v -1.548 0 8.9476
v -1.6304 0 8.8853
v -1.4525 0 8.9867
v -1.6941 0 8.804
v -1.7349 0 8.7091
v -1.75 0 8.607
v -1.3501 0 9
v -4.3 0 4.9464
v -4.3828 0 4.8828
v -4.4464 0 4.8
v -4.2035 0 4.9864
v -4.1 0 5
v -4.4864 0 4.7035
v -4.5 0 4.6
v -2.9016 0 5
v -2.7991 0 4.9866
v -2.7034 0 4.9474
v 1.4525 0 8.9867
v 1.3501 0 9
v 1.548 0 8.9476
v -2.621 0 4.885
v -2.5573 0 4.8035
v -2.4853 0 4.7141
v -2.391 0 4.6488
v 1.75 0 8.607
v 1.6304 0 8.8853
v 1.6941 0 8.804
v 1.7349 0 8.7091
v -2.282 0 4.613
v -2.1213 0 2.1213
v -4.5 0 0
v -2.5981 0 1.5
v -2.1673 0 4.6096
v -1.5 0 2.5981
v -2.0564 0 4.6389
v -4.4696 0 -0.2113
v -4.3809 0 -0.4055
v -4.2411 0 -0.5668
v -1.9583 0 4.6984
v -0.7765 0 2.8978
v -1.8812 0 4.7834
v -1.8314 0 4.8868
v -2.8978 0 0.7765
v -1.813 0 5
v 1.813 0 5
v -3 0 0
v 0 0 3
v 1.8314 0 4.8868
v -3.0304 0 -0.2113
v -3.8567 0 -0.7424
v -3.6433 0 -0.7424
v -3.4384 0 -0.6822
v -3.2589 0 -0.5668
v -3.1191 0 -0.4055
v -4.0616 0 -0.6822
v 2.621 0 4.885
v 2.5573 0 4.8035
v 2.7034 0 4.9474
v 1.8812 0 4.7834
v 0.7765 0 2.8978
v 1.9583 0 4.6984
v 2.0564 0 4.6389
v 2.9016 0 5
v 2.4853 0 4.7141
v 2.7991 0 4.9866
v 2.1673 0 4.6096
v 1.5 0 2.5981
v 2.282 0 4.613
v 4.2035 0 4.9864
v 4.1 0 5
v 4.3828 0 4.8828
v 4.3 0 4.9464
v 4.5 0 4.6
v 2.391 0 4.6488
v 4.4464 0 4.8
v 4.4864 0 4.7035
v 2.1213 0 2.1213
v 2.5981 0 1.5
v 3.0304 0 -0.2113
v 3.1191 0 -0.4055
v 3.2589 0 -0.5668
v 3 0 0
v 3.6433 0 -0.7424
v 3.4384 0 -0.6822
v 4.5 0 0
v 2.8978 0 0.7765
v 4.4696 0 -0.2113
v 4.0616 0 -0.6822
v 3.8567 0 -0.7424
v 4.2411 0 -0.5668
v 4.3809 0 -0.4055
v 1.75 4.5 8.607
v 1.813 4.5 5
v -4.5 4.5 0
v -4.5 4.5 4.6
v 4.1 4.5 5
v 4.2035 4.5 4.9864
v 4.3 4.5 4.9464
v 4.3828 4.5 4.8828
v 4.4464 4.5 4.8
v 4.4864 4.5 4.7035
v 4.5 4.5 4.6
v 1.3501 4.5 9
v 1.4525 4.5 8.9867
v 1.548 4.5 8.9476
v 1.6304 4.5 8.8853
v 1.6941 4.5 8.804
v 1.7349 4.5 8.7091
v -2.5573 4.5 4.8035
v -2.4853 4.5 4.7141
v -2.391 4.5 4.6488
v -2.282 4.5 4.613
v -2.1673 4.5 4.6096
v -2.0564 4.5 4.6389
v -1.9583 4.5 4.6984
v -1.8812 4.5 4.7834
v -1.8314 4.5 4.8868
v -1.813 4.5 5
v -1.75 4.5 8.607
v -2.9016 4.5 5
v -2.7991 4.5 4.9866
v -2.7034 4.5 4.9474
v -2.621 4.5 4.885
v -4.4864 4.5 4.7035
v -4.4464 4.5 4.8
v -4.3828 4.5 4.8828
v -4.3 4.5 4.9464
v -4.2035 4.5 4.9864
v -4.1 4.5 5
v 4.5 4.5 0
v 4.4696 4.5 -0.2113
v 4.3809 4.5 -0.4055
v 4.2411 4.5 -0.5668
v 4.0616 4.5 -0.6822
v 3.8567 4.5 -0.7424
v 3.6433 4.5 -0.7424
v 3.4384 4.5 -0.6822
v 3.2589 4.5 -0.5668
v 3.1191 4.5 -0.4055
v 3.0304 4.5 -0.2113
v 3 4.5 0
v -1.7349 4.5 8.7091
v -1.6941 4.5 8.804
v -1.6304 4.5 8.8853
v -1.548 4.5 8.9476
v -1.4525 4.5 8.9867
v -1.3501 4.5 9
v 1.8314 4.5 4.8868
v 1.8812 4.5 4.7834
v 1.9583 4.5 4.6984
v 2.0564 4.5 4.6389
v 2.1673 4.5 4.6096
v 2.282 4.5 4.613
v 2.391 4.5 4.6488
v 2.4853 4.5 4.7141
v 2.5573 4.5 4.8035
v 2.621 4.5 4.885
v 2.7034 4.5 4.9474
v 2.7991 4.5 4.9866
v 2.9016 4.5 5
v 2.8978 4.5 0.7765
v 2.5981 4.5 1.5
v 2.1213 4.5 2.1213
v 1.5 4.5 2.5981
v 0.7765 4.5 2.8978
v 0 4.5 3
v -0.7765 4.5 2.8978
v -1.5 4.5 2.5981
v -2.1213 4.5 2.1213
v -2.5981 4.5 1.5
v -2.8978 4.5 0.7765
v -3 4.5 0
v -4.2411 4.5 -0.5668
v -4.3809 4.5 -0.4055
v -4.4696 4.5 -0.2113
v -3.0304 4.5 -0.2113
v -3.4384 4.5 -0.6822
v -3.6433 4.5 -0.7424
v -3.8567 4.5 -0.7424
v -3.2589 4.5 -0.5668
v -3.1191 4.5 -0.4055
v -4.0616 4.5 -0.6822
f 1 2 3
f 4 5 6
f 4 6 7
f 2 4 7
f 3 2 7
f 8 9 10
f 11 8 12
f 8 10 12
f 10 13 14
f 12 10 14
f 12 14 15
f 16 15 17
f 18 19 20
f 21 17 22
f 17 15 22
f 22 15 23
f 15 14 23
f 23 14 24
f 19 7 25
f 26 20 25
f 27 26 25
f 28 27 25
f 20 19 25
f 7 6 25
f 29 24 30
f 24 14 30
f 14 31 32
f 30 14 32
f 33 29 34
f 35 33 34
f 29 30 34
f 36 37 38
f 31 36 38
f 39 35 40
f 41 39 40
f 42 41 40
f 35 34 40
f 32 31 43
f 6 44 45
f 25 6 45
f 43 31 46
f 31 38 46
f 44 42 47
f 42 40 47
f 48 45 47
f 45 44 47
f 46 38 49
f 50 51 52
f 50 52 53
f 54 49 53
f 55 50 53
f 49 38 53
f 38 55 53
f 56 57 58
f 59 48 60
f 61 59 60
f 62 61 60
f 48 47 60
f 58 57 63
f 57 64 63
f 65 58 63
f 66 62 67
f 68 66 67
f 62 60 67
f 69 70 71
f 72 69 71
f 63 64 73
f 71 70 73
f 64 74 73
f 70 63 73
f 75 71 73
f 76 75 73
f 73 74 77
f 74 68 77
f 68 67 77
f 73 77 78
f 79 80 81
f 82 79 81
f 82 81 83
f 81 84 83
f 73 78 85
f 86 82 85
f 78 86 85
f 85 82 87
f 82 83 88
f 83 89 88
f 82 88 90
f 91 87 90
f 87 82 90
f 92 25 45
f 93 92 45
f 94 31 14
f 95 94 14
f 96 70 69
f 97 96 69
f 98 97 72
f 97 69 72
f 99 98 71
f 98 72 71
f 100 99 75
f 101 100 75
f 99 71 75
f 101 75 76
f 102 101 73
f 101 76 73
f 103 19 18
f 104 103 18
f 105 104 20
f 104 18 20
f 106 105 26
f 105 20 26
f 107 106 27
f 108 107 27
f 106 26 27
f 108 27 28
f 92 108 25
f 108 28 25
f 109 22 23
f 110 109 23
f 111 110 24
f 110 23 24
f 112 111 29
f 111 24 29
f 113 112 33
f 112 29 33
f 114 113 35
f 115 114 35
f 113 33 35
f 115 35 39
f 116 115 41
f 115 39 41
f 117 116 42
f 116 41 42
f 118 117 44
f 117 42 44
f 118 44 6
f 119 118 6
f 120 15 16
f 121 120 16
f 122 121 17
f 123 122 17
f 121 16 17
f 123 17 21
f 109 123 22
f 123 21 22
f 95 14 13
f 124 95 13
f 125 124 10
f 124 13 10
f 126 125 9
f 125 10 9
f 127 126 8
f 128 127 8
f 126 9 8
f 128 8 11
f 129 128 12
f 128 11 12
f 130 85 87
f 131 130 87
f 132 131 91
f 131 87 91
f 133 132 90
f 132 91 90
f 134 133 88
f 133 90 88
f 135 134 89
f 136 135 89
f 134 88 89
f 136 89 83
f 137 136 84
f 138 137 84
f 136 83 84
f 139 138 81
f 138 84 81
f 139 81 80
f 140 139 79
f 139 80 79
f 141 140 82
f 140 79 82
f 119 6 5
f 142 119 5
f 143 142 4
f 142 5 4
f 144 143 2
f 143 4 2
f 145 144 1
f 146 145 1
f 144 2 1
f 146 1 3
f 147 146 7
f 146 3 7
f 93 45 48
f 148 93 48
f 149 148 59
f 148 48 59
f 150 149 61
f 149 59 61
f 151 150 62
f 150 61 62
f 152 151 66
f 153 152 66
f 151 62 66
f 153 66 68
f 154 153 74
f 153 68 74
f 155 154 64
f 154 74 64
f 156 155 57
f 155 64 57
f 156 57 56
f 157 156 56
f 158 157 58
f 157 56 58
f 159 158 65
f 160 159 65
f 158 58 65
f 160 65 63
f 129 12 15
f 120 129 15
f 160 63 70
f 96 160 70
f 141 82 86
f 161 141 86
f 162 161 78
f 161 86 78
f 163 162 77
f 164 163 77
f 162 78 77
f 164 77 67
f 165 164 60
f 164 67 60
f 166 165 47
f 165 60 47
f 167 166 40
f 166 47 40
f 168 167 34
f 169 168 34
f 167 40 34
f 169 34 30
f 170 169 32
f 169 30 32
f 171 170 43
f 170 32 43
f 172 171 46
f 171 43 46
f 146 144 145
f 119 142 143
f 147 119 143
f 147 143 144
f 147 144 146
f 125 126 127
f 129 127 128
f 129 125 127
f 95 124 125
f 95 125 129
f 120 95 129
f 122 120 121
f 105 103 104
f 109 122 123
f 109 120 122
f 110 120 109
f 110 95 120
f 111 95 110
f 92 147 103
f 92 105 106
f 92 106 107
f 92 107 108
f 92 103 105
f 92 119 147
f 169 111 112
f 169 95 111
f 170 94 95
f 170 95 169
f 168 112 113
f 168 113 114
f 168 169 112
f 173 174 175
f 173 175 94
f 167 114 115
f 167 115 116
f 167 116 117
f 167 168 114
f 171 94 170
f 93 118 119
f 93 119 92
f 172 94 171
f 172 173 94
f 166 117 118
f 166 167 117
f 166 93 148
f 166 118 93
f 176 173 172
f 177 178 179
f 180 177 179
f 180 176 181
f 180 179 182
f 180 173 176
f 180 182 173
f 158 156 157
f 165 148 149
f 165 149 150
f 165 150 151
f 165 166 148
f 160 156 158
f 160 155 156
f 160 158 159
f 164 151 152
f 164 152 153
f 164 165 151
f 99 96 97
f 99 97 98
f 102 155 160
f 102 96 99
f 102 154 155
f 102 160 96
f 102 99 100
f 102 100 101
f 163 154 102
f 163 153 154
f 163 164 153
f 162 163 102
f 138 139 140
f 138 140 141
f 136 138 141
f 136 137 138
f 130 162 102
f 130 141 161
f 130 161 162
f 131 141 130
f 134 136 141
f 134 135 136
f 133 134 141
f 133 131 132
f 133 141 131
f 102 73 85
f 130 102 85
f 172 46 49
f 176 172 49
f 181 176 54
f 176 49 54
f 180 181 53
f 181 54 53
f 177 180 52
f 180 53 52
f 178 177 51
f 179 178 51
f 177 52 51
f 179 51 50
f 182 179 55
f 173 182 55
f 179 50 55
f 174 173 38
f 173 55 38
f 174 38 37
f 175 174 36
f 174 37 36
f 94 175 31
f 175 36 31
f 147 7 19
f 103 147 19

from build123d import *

# Parameters (mm, degrees)
BOSS_EXTRUDE1_DEPTH = 4.5


with BuildPart() as part:
    # Sketch1 → Boss-Extrude1 (new body)
    with BuildSketch(Plane(origin=(0, 0, 0), x_dir=(1, 0, 0), z_dir=(0, 1, 0))):
        with BuildLine():
            Line((-4.5, 0), (-4.5, -4.6))
            ThreePointArc((-4.5, -4.6), (-4.382842712, -4.882842712), (-4.1, -5))
            Line((-4.1, -5), (-2.901641857, -5))
            ThreePointArc((-2.901641857, -5), (-2.70339478, -4.947416315), (-2.557270511, -4.803490481))
            ThreePointArc((-2.557270511, -4.803490481), (-2.110791668, -4.620232906), (-1.812960087, -5))
            Line((-1.812960087, -5), (-1.75, -8.606980963))
            ThreePointArc((-1.75, -8.606980963), (-1.630424628, -8.88530018), (-1.350060922, -9))
            Line((-1.350060922, -9), (1.350060922, -9))
            ThreePointArc((1.350060922, -9), (1.630424628, -8.88530018), (1.75, -8.606980963))
            Line((1.75, -8.606980963), (1.812960087, -5))
            ThreePointArc((1.812960087, -5), (2.110791668, -4.620232906), (2.557270511, -4.803490481))
            ThreePointArc((2.557270511, -4.803490481), (2.70339478, -4.947416315), (2.901641857, -5))
            Line((2.901641857, -5), (4.1, -5))
            ThreePointArc((4.1, -5), (4.382842712, -4.882842712), (4.5, -4.6))
            Line((4.5, -4.6), (4.5, 0))
            ThreePointArc((4.5, 0), (3.75, 0.75), (3, 0))
            ThreePointArc((3, 0), (0, -3), (-3, 0))
            ThreePointArc((-3, 0), (-3.75, 0.75), (-4.5, 0))
        make_face()
    extrude(amount=BOSS_EXTRUDE1_DEPTH)


solid = part.part
